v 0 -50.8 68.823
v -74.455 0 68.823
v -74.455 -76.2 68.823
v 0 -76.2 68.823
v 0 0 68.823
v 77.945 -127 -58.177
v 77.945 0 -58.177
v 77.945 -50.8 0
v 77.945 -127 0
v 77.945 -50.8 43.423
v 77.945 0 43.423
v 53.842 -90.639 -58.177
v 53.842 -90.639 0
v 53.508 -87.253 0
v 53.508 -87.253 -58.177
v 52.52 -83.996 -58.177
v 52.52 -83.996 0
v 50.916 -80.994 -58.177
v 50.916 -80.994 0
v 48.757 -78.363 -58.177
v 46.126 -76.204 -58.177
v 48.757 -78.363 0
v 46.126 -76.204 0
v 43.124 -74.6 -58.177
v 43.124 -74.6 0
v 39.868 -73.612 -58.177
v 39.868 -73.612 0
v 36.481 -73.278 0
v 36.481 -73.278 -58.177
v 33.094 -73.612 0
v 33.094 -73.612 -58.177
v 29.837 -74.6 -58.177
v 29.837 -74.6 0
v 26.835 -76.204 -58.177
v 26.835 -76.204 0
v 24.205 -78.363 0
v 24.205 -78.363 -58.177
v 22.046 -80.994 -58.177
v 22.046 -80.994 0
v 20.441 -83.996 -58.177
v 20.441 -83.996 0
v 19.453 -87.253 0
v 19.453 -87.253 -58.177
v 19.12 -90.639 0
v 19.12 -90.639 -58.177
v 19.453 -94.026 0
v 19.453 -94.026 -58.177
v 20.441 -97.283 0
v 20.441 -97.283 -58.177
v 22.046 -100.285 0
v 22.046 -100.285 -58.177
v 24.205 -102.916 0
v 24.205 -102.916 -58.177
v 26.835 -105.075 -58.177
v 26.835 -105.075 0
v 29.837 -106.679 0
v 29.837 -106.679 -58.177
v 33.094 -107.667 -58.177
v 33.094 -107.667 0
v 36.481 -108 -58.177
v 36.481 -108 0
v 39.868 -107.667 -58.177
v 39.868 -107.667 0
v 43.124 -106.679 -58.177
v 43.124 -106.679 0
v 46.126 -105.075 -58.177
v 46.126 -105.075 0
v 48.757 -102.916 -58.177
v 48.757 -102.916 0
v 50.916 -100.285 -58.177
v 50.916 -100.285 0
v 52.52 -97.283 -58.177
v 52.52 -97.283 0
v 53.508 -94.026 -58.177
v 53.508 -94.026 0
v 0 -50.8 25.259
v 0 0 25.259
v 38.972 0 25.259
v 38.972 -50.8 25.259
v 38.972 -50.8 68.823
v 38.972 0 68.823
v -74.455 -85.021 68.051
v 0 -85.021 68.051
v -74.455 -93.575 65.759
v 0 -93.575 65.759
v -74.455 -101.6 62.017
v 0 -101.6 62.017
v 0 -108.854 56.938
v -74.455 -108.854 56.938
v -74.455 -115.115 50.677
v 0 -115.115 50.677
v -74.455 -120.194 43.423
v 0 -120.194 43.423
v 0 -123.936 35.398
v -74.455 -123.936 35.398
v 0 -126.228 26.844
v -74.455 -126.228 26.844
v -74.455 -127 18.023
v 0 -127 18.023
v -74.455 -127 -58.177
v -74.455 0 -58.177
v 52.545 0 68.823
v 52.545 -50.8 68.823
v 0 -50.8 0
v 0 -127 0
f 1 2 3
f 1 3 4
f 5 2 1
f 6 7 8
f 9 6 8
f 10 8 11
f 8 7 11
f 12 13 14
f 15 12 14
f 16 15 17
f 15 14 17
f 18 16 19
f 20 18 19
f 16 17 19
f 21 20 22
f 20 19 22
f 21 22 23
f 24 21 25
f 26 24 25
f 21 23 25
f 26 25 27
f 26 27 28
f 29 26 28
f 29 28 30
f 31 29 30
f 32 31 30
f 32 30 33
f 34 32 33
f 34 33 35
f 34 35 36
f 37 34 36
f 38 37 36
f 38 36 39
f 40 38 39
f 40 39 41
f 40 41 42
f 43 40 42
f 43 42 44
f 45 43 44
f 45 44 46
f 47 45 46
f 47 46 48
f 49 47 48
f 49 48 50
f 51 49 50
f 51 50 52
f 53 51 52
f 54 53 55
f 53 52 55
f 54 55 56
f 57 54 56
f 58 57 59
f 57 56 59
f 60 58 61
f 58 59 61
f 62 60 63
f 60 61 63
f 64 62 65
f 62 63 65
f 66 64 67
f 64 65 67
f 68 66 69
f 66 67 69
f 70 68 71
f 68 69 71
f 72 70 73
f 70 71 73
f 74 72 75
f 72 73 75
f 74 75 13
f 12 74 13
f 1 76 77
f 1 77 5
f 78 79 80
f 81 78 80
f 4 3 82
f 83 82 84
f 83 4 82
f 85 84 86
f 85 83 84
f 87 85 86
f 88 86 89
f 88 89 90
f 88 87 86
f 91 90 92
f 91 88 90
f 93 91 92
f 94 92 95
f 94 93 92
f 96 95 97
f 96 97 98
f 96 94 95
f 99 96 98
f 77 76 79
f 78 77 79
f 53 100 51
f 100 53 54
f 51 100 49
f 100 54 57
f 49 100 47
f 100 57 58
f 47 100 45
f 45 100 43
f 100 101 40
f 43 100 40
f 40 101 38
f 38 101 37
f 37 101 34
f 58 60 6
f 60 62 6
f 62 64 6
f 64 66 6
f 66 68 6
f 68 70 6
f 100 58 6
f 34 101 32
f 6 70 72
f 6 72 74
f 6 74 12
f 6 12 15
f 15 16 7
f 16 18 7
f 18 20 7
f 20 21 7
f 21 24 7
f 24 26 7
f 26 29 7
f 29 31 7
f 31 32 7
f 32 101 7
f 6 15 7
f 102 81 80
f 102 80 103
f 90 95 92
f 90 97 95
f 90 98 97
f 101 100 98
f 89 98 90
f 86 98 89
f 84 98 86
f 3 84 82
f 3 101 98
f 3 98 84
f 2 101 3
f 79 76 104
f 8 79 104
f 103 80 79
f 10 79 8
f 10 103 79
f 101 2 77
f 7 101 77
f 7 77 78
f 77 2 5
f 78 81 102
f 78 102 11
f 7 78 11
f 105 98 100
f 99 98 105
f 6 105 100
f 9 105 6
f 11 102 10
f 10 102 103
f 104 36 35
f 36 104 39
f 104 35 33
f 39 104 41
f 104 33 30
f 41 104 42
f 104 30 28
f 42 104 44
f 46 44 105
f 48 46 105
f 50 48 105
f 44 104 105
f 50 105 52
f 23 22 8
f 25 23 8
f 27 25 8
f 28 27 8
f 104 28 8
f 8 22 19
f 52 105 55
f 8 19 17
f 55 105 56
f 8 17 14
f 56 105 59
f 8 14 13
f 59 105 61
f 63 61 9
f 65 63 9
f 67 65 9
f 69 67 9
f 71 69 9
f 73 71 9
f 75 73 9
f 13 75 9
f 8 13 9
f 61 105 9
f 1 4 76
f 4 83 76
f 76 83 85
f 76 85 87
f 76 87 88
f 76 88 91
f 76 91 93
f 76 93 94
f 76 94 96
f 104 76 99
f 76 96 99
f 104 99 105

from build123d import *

# Parameters (mm, degrees)
F0_W     = 152.4
F0_H     = 127
F1_DEPTH = 127
F3_DEPTH = 76.2
F4_W     = 38.972323
F4_H     = 43.56414
F5_DEPTH = 50.801
F6_R     = 17.360995
F7_DEPTH = 58.177971
F8_SIZE  = 25.4
F9_R     = 50.8


with BuildPart() as f1:
    # F0 (on Front) → F1 (new body)
    with BuildSketch(Plane.XZ):
        with Locations((1.744647, 5.323029)):
            Rectangle(F0_W, F0_H)
    extrude(amount=F1_DEPTH)

    # F2 (on face) → F3 (cut)
    with BuildSketch(Plane.XZ.offset(127)):
        Polygon((1.744647, 68.823029), (0, 68.823029), (0, 0), (77.944647, 0), (77.944647, 68.823029), align=None)
    extrude(amount=-F3_DEPTH, mode=Mode.SUBTRACT)

    # F4 (on face) → F5 (cut, through all)
    with BuildSketch(Plane.XZ.offset(50.8)):
        with Locations((19.486161, 47.040959)):
            Rectangle(F4_W, F4_H)
    extrude(amount=-F5_DEPTH, mode=Mode.SUBTRACT)

    # F6 (on face) → F7 (cut, through all)
    with BuildSketch(Plane.XY):
        with Locations((36.480688, -90.639494)):
            Circle(F6_R)
    extrude(amount=-F7_DEPTH, mode=Mode.SUBTRACT)

    # F8
    f8_edges = [f1.edges().sort_by_distance(p)[0] for p in [
        (77.944647, -25.4, 68.823029),
    ]]
    chamfer(f8_edges, length=F8_SIZE)

    # F9
    f9_edges = [f1.edges().sort_by_distance(p)[0] for p in [
        (-37.227677, -127, 68.823029),
    ]]
    fillet(f9_edges, radius=F9_R)


solid = f1.part
